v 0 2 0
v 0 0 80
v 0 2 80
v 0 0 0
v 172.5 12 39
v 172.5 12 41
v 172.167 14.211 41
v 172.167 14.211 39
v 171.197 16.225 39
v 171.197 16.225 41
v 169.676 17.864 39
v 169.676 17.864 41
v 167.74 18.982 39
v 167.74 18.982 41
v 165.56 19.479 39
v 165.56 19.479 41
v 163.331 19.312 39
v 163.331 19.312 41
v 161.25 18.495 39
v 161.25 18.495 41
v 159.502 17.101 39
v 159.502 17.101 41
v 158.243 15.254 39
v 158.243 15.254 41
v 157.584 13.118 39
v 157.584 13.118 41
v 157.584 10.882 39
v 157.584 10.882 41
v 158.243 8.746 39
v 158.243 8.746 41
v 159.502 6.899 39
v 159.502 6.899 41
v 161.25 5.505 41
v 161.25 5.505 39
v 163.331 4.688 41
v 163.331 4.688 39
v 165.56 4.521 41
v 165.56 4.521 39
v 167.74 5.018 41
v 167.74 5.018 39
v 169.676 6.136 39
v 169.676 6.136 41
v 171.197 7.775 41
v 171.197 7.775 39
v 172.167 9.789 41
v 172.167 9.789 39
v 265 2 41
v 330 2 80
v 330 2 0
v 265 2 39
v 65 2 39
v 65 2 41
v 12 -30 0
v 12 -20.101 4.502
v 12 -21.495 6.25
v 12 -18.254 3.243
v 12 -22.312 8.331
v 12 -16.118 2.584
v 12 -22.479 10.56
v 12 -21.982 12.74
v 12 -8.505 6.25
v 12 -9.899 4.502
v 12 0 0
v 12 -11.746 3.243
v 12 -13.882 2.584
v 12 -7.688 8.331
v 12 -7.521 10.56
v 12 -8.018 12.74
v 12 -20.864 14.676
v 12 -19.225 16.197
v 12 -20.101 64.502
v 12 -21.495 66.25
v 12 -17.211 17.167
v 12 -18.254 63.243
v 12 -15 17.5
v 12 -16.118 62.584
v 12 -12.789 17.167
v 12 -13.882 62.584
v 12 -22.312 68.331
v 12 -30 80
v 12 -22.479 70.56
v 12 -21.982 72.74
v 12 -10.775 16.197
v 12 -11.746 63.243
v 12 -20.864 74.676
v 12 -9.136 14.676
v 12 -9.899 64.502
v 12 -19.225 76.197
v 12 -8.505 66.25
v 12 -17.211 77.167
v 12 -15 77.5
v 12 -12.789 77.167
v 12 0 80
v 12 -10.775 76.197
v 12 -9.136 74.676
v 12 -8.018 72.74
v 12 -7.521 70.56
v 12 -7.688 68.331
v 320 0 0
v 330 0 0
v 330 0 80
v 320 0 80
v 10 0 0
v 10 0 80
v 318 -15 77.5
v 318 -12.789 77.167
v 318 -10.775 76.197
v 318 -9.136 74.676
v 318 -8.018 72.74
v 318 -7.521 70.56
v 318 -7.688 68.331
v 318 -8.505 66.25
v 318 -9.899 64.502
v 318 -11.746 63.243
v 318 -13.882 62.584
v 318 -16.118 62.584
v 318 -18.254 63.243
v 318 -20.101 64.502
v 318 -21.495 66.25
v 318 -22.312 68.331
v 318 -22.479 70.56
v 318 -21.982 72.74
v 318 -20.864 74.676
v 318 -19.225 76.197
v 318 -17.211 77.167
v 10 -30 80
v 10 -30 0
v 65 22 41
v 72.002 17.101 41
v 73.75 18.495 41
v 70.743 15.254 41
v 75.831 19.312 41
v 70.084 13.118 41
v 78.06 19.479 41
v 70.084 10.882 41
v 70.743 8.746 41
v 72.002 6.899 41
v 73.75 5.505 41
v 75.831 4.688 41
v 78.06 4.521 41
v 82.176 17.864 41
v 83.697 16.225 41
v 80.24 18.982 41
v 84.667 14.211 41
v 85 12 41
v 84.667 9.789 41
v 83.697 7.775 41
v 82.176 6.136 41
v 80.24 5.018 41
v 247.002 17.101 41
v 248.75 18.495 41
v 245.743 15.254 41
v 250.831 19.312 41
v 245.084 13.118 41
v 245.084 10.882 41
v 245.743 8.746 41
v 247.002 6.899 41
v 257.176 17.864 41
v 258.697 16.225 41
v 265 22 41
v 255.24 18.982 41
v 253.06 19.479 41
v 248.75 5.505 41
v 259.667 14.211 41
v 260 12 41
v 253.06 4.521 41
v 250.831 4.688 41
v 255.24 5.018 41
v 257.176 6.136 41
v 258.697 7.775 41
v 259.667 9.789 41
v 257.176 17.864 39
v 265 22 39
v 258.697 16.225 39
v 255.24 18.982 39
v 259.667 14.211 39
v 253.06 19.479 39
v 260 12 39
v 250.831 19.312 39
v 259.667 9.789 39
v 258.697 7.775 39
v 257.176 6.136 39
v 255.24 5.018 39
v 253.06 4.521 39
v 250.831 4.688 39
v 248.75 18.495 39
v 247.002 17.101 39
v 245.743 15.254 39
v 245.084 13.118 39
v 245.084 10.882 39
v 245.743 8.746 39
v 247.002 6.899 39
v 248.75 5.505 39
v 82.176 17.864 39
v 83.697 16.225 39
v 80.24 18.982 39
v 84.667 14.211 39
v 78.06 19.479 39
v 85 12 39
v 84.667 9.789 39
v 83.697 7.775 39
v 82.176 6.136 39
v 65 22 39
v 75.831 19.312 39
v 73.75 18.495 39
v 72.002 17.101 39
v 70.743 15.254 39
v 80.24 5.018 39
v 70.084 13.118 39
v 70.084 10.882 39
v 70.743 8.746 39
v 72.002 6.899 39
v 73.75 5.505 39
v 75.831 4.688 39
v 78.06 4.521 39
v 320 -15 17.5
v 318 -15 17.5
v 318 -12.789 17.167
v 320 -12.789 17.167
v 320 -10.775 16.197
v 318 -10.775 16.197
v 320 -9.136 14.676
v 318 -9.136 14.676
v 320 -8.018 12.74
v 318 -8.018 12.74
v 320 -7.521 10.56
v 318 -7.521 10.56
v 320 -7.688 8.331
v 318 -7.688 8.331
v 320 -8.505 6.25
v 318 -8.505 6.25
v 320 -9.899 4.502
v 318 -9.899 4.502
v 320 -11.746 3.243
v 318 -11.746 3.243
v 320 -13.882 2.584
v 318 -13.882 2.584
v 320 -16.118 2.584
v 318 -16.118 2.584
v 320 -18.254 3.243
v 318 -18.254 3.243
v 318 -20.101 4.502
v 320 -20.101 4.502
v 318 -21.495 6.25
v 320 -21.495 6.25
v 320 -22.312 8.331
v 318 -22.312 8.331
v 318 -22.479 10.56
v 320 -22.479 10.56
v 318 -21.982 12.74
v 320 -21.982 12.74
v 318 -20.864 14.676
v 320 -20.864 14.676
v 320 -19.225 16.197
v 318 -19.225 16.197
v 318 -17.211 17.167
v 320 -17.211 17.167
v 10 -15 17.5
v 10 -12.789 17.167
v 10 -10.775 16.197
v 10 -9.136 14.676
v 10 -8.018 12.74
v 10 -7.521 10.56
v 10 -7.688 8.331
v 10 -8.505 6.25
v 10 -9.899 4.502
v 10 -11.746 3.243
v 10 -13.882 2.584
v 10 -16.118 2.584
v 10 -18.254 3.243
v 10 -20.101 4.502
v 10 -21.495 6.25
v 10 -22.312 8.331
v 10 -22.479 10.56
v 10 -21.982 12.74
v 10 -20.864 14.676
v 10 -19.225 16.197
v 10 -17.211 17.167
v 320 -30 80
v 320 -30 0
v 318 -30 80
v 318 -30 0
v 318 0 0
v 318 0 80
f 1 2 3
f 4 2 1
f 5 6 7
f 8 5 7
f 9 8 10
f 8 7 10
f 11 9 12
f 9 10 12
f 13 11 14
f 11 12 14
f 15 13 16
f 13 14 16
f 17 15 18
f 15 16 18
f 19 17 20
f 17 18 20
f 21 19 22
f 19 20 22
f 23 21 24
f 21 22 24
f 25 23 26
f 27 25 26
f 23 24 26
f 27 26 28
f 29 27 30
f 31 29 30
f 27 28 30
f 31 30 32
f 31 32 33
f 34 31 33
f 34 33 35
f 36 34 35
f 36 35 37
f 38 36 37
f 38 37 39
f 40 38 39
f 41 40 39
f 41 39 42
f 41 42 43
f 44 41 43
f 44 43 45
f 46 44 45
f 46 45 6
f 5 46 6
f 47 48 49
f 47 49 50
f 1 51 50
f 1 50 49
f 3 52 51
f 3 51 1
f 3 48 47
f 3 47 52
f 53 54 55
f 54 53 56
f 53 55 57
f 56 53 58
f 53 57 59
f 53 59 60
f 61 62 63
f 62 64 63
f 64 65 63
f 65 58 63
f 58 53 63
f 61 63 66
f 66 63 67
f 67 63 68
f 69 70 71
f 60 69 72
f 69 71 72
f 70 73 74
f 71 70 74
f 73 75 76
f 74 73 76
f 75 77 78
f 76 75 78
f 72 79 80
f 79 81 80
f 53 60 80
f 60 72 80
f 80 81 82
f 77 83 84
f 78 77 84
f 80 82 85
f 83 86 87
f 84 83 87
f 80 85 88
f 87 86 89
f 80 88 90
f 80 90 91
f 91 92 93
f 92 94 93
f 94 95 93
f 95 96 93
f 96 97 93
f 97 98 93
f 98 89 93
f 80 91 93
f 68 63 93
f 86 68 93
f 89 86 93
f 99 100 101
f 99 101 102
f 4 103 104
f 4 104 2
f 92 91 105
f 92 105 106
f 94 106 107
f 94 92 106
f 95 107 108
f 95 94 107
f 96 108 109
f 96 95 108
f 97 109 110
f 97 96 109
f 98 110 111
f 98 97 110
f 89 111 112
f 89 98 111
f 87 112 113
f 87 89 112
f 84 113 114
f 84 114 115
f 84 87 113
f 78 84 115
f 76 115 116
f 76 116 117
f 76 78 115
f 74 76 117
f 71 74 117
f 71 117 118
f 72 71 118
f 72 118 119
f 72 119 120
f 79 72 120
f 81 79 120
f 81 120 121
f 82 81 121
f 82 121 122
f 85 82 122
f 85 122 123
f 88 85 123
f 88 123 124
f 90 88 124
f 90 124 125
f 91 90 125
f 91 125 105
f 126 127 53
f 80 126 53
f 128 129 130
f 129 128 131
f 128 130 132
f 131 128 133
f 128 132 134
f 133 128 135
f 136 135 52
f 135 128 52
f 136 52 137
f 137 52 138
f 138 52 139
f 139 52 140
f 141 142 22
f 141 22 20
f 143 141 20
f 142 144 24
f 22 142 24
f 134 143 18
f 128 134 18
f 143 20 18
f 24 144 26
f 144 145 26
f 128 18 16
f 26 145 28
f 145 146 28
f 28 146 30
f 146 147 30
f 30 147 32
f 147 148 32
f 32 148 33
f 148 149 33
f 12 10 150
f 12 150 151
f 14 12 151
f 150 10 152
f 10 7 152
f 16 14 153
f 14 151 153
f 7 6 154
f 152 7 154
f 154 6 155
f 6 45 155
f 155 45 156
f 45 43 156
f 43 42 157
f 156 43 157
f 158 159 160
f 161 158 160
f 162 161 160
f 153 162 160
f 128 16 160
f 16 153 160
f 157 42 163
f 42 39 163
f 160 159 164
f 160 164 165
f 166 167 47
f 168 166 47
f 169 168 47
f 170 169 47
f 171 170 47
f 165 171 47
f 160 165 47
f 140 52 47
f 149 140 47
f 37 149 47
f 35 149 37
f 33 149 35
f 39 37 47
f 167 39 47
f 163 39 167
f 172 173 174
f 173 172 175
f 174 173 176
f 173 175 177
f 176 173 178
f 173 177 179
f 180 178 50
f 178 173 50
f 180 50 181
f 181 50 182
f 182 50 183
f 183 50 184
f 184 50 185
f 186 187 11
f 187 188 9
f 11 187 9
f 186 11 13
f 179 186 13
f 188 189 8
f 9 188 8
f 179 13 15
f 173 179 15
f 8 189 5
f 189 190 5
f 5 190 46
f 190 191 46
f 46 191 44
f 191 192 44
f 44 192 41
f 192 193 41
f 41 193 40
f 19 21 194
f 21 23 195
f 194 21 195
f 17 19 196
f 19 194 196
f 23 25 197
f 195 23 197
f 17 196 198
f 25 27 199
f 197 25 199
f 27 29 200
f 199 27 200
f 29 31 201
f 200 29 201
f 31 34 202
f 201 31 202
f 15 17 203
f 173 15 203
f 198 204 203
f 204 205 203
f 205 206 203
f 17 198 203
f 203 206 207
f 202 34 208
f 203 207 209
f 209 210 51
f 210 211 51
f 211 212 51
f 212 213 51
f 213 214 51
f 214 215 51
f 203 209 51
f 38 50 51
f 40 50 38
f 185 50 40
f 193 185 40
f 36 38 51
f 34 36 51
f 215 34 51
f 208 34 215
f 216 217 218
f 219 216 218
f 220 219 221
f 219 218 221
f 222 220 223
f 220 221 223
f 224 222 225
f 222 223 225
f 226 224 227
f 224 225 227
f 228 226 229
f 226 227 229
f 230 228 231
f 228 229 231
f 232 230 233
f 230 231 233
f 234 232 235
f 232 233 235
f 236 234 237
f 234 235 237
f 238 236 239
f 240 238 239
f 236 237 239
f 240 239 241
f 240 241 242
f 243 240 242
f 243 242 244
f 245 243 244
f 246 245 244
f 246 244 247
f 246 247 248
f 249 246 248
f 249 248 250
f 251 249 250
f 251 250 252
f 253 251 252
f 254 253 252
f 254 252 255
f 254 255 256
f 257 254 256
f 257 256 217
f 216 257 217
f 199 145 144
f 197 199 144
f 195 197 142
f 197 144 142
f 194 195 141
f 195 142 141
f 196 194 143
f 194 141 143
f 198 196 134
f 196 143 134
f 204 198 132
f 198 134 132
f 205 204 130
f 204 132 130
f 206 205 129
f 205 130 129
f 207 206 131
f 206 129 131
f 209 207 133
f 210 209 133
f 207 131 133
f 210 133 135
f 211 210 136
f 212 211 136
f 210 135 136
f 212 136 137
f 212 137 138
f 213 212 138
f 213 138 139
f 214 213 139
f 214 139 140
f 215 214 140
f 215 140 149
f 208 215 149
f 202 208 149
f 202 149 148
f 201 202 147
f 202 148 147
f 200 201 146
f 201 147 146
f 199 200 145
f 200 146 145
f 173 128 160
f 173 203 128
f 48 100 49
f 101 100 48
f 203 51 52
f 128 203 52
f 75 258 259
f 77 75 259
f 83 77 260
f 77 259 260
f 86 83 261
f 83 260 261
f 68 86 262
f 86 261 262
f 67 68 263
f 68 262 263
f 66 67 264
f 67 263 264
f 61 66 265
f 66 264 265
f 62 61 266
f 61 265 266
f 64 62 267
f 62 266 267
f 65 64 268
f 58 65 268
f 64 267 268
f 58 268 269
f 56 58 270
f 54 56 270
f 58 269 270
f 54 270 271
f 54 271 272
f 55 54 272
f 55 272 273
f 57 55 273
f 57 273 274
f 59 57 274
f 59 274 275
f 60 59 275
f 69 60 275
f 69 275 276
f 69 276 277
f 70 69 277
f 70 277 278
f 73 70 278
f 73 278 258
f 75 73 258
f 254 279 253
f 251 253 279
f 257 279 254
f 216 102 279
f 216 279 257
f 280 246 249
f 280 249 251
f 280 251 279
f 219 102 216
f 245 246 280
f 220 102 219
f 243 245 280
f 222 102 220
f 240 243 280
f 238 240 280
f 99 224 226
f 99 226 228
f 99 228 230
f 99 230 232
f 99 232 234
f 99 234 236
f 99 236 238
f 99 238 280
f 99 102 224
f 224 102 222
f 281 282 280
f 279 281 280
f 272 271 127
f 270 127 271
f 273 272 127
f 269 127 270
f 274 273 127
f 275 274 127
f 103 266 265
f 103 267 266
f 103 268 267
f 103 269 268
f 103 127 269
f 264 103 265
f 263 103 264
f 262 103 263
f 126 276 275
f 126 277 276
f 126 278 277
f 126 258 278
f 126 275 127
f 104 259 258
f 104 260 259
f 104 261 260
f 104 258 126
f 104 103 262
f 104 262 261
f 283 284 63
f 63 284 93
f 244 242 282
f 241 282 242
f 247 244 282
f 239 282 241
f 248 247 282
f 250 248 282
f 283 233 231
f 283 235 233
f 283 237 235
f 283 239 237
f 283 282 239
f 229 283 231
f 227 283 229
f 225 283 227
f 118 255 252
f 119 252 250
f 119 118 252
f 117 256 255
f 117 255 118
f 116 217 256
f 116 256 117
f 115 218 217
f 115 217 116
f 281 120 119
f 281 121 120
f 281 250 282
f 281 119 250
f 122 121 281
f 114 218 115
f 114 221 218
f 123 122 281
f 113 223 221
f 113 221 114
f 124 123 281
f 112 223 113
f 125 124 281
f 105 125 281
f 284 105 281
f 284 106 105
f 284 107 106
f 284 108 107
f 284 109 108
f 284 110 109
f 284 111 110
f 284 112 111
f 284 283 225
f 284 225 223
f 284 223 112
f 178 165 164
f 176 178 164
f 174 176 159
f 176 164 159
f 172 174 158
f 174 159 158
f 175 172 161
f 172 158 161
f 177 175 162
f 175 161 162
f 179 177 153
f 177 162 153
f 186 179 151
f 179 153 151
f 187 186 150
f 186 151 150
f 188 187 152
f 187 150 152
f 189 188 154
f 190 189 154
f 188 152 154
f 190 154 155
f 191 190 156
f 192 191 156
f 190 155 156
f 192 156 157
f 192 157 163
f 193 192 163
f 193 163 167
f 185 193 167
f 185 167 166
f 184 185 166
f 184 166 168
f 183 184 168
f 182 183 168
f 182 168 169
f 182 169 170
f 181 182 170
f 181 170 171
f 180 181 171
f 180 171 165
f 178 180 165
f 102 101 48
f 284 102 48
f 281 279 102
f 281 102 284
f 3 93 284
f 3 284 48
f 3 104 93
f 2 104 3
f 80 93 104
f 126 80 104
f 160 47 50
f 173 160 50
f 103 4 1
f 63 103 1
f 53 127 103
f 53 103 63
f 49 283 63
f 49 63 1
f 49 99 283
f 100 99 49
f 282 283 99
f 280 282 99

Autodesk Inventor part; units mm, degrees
ref_plane "YZ Plane" through (0, 0, 0) normal (1, 0, 0) x (0, 1, 0)
ref_plane "XZ Plane" through (0, 0, 0) normal (0, 1, 0) x (-1, 0, 0)
ref_plane "XY Plane" through (0, 0, 0) normal (0, 0, 1) x (1, 0, 0)
sketch "Sketch1" plane through (0, 0, 0) normal (0, 0, 1) x (1, 0, 0)
  point P0 (0, 0)
sketch "Sketch2" plane through (0, 0, 0) normal (0, 1, 0) x (-1, 0, 0)
  line L0 (0, 0) -> (-330, 0)
  line L1 (-330, 0) -> (-330, 80)
  line L2 (-330, 80) -> (0, 80)
  line L3 (0, 80) -> (0, 0)
  dimension "d0" = 330
  dimension "d1" = 80
extrude "Extrusion1" add sketch "Sketch2" along normal blind 2
sketch "Sketch3" plane through (0, 2, 0) normal (0, 1, 0) x (1, 0, 0)
  line L0 (0, 0) -> (0, -80) projected
  line L1 (330, -80) -> (330, 0) projected
  line L2 (0, -39) -> (0, -41)
  line L3 (330, -39) -> (330, -41)
  line L4 (165, -39) -> (65, -39)
  line L5 (65, -39) -> (65, -41)
  line L6 (65, -41) -> (265, -41)
  line L7 (265, -41) -> (265, -39)
  line L8 (165, -39) -> (265, -39)
  dimension "d5" = 165
  dimension "d6" = 100
  dimension "d7" = 2
  dimension "d8" = 200
extrude "Extrusion2" add sketch "Sketch3" along normal blind 20
sketch "Sketch4" plane through (65, 2, 41) normal (0, 0, 1) x (1, 0, 0)
  circle A0 centre (100, 10) radius 7.5
  circle A1 centre (12.5, 10) radius 7.5
  circle A2 centre (187.5, 10) radius 7.5
  point P0 (-65, -2)
  dimension "d11" = 15
  dimension "d12" = 15
  dimension "d13" = 15
extrude "Extrusion3" cut sketch "Sketch4" against normal through all
sketch "Sketch5" plane through (0, 0, 0) normal (0, -1, 0) x (1, 0, 0)
  line L0 (0, 80) -> (330, 80) projected
  line L1 (10, 0) -> (12, 0)
  line L2 (12, 0) -> (12, 80)
  line L3 (12, 80) -> (10, 80)
  line L4 (10, 80) -> (10, 0)
  line L5 (330, 0) -> (0, 0) projected
  line L6 (320, 0) -> (318, 0)
  line L7 (318, 0) -> (318, 80)
  line L8 (318, 80) -> (320, 80)
  line L9 (320, 80) -> (320, 0)
  dimension "d16" = 2
  dimension "d17" = 2
extrude "Extrusion4" add sketch "Sketch5" along normal blind 30 contours L0 L2 L1 L4 | L0 L9 L5 L7
sketch "Sketch6" plane through (10, 0, 0) normal (-1, 0, 0) x (0, 0, 1)
  circle A0 centre (70, -15) radius 7.5
  point P0 (0, 0)
  dimension "d23" = 15
extrude "Extrusion5" add sketch "Sketch6" against normal blind 310
sketch "Sketch7" plane through (10, 0, 0) normal (-1, 0, 0) x (0, 0, 1)
  circle A0 centre (10, -15) radius 7.5
  point P0 (0, 0)
  dimension "d26" = 15
extrude "Extrusion6" cut sketch "Sketch7" against normal through all
properties part number "Claw_Platform_2"
